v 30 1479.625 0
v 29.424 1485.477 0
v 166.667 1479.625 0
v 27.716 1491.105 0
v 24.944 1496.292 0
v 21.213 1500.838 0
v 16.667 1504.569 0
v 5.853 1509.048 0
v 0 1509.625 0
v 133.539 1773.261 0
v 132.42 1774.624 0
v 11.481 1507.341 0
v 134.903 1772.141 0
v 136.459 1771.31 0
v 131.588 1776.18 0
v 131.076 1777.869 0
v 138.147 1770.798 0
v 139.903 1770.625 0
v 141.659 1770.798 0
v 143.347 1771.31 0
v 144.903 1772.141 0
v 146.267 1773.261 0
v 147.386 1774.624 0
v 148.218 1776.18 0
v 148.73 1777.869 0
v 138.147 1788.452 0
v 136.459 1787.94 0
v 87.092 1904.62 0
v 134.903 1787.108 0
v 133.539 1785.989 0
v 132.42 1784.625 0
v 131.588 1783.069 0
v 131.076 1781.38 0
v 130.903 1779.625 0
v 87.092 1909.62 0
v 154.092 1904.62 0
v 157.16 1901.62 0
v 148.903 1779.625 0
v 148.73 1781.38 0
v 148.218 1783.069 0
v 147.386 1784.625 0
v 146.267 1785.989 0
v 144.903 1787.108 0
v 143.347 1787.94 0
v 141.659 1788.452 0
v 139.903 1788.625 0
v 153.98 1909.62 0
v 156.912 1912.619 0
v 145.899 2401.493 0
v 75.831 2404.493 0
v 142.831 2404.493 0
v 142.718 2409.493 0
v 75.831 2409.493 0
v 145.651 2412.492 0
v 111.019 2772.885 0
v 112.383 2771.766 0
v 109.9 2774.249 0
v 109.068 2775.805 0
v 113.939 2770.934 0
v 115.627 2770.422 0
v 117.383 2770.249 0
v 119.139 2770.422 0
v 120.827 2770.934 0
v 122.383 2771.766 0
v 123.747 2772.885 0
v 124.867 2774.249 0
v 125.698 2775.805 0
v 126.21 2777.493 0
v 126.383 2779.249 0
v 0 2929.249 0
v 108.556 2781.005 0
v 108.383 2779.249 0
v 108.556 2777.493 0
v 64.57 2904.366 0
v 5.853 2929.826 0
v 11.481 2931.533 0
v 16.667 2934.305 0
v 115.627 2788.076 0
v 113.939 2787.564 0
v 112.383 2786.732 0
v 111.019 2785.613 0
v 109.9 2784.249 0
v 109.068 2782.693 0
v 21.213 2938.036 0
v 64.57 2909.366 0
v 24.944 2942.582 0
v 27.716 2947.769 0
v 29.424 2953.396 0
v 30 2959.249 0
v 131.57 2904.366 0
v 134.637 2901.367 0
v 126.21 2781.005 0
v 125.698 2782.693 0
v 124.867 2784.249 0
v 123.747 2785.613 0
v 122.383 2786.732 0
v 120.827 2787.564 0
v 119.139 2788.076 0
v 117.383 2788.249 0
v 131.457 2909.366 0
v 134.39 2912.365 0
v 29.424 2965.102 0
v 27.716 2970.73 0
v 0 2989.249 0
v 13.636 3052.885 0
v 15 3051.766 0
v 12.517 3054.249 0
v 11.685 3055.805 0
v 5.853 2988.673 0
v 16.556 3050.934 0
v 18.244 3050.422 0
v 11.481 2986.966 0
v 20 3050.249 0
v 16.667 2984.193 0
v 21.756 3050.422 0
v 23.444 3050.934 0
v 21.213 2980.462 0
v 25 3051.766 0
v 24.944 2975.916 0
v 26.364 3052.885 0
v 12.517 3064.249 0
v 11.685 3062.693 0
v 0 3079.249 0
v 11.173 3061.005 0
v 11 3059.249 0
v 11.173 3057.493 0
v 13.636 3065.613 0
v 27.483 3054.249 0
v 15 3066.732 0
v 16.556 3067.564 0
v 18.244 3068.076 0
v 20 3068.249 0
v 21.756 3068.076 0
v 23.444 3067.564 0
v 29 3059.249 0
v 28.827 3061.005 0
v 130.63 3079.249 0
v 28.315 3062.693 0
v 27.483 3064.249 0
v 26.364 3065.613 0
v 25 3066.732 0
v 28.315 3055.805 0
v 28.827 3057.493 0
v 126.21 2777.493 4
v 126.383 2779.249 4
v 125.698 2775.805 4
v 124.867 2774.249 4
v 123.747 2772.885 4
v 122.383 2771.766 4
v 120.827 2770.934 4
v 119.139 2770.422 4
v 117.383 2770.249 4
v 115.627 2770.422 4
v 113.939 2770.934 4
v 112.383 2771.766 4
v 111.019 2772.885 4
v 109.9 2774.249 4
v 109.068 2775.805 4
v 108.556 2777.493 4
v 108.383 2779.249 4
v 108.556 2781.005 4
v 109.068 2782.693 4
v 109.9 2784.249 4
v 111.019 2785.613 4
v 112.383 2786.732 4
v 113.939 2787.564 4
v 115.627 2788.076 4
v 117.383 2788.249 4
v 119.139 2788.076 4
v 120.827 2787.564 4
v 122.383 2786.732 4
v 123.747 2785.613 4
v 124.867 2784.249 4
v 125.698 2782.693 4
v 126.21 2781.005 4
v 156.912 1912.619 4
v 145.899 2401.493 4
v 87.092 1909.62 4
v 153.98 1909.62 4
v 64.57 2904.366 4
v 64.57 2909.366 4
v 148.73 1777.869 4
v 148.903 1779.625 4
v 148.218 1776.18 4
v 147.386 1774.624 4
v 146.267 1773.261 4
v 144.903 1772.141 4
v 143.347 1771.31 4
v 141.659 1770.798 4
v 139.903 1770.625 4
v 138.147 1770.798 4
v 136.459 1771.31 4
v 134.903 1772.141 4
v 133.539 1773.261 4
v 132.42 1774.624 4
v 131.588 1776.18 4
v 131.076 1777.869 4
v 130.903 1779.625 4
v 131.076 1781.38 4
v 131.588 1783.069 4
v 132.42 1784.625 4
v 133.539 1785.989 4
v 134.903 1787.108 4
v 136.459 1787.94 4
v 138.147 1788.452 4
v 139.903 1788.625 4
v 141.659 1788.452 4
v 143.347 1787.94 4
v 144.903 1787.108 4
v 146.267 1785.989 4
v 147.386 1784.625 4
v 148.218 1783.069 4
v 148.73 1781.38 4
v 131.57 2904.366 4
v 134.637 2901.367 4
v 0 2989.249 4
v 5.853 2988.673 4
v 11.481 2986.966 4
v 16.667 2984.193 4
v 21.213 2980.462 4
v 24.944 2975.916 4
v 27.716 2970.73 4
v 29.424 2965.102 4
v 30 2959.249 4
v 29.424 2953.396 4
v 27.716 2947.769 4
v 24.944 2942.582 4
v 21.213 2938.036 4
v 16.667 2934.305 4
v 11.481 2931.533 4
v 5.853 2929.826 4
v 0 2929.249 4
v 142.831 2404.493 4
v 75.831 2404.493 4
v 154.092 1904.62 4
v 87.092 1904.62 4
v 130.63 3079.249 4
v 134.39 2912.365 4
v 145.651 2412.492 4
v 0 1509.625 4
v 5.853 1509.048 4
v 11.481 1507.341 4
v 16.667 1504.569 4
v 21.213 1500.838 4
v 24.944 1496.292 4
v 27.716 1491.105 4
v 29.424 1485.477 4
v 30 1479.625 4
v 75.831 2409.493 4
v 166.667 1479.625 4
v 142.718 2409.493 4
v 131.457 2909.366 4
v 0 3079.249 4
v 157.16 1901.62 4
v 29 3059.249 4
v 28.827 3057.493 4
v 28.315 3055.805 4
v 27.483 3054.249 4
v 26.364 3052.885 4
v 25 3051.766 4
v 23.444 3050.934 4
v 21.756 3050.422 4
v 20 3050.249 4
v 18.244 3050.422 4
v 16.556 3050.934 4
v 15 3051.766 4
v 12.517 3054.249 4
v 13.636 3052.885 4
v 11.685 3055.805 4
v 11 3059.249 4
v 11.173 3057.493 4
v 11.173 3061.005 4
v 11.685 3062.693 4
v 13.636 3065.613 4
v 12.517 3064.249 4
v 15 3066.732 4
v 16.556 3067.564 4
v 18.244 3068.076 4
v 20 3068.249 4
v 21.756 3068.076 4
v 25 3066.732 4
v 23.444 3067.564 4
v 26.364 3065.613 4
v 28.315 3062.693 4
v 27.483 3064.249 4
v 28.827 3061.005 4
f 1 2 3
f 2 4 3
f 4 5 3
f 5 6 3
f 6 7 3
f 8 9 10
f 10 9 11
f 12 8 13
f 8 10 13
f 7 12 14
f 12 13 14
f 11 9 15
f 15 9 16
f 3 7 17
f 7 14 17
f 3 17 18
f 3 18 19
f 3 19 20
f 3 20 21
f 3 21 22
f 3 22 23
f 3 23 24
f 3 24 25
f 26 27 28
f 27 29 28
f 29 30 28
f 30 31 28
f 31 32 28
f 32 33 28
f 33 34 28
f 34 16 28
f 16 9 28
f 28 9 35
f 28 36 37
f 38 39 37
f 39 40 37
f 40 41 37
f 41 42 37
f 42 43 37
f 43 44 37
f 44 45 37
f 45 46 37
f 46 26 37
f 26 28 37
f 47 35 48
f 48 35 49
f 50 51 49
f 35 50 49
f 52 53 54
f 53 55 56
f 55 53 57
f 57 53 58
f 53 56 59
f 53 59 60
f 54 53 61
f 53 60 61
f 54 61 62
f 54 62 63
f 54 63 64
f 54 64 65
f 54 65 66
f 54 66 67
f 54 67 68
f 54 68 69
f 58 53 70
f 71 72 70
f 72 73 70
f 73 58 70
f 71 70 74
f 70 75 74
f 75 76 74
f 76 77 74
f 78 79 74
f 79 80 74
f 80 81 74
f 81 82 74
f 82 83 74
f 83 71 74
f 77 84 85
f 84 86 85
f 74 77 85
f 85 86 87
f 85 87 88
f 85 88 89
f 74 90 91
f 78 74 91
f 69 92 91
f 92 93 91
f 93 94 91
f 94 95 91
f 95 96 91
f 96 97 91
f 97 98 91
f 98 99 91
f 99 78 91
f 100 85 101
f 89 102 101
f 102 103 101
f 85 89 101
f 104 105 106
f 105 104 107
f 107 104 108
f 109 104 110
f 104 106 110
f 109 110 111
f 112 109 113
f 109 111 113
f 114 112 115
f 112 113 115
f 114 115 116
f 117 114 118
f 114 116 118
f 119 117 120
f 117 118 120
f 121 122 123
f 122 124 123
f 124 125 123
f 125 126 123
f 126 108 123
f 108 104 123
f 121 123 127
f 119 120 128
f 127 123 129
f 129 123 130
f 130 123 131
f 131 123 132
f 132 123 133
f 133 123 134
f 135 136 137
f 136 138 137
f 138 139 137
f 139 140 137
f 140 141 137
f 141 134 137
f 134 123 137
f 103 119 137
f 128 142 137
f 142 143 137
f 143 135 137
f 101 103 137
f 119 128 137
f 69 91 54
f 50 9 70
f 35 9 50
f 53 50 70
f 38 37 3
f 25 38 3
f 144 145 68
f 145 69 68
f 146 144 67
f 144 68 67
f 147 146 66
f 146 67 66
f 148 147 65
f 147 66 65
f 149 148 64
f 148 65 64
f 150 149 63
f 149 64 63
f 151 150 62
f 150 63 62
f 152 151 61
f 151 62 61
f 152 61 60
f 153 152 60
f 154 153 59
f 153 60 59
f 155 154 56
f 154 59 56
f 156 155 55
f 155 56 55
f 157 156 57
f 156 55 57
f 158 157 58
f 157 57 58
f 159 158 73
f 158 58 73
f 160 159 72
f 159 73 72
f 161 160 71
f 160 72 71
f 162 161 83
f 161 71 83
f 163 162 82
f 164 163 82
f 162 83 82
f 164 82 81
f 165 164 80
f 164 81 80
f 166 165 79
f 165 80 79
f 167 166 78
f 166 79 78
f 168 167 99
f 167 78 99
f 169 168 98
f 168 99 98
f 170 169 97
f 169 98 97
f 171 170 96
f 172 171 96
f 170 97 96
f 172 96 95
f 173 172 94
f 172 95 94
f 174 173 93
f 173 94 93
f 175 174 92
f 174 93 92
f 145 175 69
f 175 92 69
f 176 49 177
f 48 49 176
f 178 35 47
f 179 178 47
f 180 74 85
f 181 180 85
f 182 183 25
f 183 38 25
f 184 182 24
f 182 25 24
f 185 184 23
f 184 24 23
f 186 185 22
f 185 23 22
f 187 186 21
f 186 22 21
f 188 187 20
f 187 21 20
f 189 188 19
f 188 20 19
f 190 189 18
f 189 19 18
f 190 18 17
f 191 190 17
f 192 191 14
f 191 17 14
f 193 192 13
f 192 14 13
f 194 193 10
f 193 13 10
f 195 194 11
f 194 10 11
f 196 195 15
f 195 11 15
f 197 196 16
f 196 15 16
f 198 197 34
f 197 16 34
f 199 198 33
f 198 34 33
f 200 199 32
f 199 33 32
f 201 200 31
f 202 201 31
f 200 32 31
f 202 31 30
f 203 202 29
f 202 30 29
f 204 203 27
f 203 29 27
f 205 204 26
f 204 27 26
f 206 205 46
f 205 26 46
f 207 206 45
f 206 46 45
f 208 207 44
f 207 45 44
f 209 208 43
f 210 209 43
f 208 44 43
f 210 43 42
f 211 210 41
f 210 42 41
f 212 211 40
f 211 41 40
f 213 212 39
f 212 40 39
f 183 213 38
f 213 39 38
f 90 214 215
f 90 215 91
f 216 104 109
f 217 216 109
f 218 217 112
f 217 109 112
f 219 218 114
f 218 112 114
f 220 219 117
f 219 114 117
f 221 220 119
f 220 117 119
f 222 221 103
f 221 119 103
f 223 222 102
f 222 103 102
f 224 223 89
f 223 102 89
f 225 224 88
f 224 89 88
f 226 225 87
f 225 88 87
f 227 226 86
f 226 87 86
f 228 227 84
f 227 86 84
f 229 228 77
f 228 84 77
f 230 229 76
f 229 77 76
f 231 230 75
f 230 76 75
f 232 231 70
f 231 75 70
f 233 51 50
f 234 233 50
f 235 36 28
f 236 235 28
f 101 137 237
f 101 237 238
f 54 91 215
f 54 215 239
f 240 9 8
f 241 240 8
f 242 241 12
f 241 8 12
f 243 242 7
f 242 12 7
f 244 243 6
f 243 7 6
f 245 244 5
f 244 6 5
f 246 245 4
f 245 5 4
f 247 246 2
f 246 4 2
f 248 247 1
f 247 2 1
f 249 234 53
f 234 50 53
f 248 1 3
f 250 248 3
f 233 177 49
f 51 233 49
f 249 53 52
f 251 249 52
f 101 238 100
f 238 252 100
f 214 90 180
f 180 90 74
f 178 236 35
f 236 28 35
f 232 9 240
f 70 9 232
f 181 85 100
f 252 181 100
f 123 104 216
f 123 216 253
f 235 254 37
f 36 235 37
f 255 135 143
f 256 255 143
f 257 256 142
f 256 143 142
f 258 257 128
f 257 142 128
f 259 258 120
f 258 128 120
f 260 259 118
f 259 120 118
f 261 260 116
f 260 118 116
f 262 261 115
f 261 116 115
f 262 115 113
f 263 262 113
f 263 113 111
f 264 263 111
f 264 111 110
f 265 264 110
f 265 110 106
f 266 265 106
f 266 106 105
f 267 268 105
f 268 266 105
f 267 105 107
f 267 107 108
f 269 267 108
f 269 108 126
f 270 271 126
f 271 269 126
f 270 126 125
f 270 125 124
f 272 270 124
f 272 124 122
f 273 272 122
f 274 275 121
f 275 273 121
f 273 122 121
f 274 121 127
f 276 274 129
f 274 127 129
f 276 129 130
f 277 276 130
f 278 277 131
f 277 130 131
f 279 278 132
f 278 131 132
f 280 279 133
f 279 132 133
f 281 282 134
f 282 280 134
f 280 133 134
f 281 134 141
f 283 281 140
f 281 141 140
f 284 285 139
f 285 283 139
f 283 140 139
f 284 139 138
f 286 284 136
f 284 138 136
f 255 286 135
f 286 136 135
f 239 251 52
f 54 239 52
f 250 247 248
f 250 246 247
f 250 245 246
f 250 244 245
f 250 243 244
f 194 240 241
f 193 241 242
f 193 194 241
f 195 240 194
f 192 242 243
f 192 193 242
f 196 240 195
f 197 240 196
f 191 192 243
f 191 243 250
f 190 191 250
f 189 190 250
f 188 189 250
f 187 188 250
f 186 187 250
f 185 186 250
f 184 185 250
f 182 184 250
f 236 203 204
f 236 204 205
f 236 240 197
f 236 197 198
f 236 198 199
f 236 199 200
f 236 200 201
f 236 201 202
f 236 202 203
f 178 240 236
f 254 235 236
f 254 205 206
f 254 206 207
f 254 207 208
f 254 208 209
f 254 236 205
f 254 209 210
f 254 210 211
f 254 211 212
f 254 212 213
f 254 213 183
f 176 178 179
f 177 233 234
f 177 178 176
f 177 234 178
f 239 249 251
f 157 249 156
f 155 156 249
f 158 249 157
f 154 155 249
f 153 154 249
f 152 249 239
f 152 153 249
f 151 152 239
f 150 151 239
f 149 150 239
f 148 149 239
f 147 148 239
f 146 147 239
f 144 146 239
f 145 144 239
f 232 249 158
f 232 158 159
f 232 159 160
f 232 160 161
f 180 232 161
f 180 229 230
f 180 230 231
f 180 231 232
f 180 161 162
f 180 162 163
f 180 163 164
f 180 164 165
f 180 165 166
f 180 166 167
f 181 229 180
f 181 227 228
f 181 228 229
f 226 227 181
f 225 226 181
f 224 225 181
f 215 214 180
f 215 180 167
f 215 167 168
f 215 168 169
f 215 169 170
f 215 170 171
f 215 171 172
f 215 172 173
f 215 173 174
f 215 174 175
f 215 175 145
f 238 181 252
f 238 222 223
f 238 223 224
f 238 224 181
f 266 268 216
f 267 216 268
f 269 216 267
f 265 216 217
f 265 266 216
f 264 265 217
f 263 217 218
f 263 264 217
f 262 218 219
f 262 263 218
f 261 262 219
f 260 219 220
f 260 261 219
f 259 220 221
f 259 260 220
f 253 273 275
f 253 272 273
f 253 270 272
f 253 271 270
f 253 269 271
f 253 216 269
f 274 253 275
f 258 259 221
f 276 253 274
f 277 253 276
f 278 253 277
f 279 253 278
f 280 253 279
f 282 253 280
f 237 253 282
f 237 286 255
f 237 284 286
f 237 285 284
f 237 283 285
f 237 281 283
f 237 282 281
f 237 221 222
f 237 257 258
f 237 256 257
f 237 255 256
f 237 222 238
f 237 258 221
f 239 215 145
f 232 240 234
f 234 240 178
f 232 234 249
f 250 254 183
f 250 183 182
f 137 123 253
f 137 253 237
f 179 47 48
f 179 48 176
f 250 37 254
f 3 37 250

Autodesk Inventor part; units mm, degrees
ref_plane "YZ Plane" through (0, 0, 0) normal (1, 0, 0) x (0, 1, 0)
ref_plane "XZ Plane" through (0, 0, 0) normal (0, 1, 0) x (-1, 0, 0)
ref_plane "XY Plane" through (0, 0, 0) normal (0, 0, 1) x (1, 0, 0)
sketch "Sketch1" plane through (0, 0, 0) normal (0, 0, 1) x (1, 0, 0)
  line L0 (0, 0) -> (0, 4438.8737)
  line L1 (0, 4438.8737) -> (100, 4438.8737)
  line L2 (100, 4438.8737) -> (200, 0)
  line L3 (200, 0) -> (0, 0)
  circle A0 centre (0, 0) radius 30
  line L4 (0, 1479.6246) -> (166.6667, 1479.6246)
  line L5 (0, 2959.2492) -> (133.3333, 2959.2492)
  circle A1 centre (0, 1479.6246) radius 30
  circle A2 centre (0, 2959.2492) radius 30
  line L6 (190.8761, 405) -> (120.8761, 405)
  line L7 (120.8761, 405) -> (120.8761, 410)
  line L8 (120.8761, 410) -> (190.8761, 410)
  line L9 (190.8761, 410) -> (190.8761, 405)
  line L10 (109.6148, 909.8732) -> (179.6148, 909.8732)
  line L11 (179.6148, 904.8732) -> (109.6148, 904.8732)
  line L12 (109.6148, 904.8732) -> (109.6148, 909.8732)
  line L13 (179.6148, 909.8732) -> (179.6148, 904.8732)
  line L14 (98.3535, 1409.7463) -> (168.3535, 1409.7463)
  line L15 (168.3535, 1404.7463) -> (98.3535, 1404.7463)
  line L16 (98.3535, 1404.7463) -> (98.3535, 1409.7463)
  line L17 (168.3535, 1409.7463) -> (168.3535, 1404.7463)
  line L18 (87.0923, 1909.6195) -> (157.0923, 1909.6195)
  line L19 (157.0923, 1904.6195) -> (87.0923, 1904.6195)
  line L20 (87.0923, 1904.6195) -> (87.0923, 1909.6195)
  line L21 (157.0923, 1909.6195) -> (157.0923, 1904.6195)
  line L22 (75.831, 2409.4927) -> (145.831, 2409.4927)
  line L23 (145.831, 2404.4927) -> (75.831, 2404.4927)
  line L24 (75.831, 2404.4927) -> (75.831, 2409.4927)
  line L25 (145.831, 2409.4927) -> (145.831, 2404.4927)
  line L26 (64.5698, 2909.3658) -> (134.5698, 2909.3658)
  line L27 (134.5698, 2904.3658) -> (64.5698, 2904.3658)
  line L28 (64.5698, 2904.3658) -> (64.5698, 2909.3658)
  line L29 (134.5698, 2909.3658) -> (134.5698, 2904.3658)
  line L30 (53.3085, 3409.239) -> (123.3085, 3409.239)
  line L31 (123.3085, 3404.239) -> (53.3085, 3404.239)
  line L32 (53.3085, 3404.239) -> (53.3085, 3409.239)
  line L33 (123.3085, 3409.239) -> (123.3085, 3404.239)
  line L34 (42.0472, 3909.1122) -> (112.0472, 3909.1122)
  line L35 (112.0472, 3904.1122) -> (42.0472, 3904.1122)
  line L36 (42.0472, 3904.1122) -> (42.0472, 3909.1122)
  line L37 (112.0472, 3909.1122) -> (112.0472, 3904.1122)
  line L38 (0, 1629.6246) -> (163.2874, 1629.6246)
  line L39 (0, 3079.2492) -> (130.6299, 3079.2492)
  circle A3 centre (20, 3059.2492) radius 9
  circle A4 centre (117.3833, 2779.2492) radius 9
  circle A5 centre (139.9031, 1779.6246) radius 9
  line L40 (139.9031, 1779.6246) -> (117.3833, 2779.2492)
  point P0 (30, 2959.2492)
  point P1 (0, 2929.2492)
  point P2 (0, 1509.6246)
  point P3 (0, 1449.6246)
  point P4 (0, 30)
  point P5 (30, 0)
  point P6 (190.7634, 410)
  point P7 (179.5022, 909.8732)
  point P8 (168.3535, 1404.7463)
  point P9 (168.2409, 1409.7463)
  point P10 (30, 1479.6246)
  point P11 (157.0923, 1904.6195)
  point P12 (156.9796, 1909.6195)
  point P13 (145.831, 2404.4927)
  point P14 (145.7184, 2409.4927)
  point P15 (134.5698, 2904.3658)
  point P16 (134.4571, 2909.3658)
  point P17 (0, 2989.2492)
  dimension "d65" = 100
  dimension "d67" = 200
  dimension "d68" = 60
  dimension "d69" = 1480
  dimension "d70" = 1480
  dimension "d71" = 1480
  dimension "d72" = 5
  dimension "d73" = 70
  dimension "d74" = 410
  dimension "d77" = 500
  dimension "d82" = 120
  dimension "d83" = 150
  dimension "d88" = 18
  dimension "d89" = 20
  dimension "d90" = 20
  dimension "d91" = 20
  dimension "d92" = 300
  dimension "d93" = 300
extrude "Plate3" add sketch "Sketch1" along normal blind 4 contours L39 L2 L5 A2 L0 | L5 L2 L26 L28 L27 L22 L24 L23 L40 L18 L20 L19 L38 L0 A2 | L38 L2 L4 A1 L0 | L18 L40 L23 L2
chamfer "Corner Chamfer2" distance 3 angle 45 6 edges at (157.0923, 1904.6195, 2) (156.9796, 1909.6195, 2) (145.831, 2404.4927, 2) (145.7184, 2409.4927, 2) (134.5698, 2904.3658, 2) (134.4571, 2909.3658, 2)
equation "\"BendRadius\" = Thickness"
equation "\"BendReliefWidth\" = Thickness"
equation "\"BendReliefDepth\" = 0.5 * Thickness"
equation "\"CornerReliefSize\" = 4 * Thickness"
equation "\"MinimumRemnant\" = 2 * Thickness"
equation "\"TransitionRadius\" = BendRadius"
equation "\"JacobiRadiusSize\" = BendRadius"
equation "\"GapSize\" = Thickness"
equation "\"Thickness\" = 4"
properties part number "GBK 3212 central second rib" material "Steel"
